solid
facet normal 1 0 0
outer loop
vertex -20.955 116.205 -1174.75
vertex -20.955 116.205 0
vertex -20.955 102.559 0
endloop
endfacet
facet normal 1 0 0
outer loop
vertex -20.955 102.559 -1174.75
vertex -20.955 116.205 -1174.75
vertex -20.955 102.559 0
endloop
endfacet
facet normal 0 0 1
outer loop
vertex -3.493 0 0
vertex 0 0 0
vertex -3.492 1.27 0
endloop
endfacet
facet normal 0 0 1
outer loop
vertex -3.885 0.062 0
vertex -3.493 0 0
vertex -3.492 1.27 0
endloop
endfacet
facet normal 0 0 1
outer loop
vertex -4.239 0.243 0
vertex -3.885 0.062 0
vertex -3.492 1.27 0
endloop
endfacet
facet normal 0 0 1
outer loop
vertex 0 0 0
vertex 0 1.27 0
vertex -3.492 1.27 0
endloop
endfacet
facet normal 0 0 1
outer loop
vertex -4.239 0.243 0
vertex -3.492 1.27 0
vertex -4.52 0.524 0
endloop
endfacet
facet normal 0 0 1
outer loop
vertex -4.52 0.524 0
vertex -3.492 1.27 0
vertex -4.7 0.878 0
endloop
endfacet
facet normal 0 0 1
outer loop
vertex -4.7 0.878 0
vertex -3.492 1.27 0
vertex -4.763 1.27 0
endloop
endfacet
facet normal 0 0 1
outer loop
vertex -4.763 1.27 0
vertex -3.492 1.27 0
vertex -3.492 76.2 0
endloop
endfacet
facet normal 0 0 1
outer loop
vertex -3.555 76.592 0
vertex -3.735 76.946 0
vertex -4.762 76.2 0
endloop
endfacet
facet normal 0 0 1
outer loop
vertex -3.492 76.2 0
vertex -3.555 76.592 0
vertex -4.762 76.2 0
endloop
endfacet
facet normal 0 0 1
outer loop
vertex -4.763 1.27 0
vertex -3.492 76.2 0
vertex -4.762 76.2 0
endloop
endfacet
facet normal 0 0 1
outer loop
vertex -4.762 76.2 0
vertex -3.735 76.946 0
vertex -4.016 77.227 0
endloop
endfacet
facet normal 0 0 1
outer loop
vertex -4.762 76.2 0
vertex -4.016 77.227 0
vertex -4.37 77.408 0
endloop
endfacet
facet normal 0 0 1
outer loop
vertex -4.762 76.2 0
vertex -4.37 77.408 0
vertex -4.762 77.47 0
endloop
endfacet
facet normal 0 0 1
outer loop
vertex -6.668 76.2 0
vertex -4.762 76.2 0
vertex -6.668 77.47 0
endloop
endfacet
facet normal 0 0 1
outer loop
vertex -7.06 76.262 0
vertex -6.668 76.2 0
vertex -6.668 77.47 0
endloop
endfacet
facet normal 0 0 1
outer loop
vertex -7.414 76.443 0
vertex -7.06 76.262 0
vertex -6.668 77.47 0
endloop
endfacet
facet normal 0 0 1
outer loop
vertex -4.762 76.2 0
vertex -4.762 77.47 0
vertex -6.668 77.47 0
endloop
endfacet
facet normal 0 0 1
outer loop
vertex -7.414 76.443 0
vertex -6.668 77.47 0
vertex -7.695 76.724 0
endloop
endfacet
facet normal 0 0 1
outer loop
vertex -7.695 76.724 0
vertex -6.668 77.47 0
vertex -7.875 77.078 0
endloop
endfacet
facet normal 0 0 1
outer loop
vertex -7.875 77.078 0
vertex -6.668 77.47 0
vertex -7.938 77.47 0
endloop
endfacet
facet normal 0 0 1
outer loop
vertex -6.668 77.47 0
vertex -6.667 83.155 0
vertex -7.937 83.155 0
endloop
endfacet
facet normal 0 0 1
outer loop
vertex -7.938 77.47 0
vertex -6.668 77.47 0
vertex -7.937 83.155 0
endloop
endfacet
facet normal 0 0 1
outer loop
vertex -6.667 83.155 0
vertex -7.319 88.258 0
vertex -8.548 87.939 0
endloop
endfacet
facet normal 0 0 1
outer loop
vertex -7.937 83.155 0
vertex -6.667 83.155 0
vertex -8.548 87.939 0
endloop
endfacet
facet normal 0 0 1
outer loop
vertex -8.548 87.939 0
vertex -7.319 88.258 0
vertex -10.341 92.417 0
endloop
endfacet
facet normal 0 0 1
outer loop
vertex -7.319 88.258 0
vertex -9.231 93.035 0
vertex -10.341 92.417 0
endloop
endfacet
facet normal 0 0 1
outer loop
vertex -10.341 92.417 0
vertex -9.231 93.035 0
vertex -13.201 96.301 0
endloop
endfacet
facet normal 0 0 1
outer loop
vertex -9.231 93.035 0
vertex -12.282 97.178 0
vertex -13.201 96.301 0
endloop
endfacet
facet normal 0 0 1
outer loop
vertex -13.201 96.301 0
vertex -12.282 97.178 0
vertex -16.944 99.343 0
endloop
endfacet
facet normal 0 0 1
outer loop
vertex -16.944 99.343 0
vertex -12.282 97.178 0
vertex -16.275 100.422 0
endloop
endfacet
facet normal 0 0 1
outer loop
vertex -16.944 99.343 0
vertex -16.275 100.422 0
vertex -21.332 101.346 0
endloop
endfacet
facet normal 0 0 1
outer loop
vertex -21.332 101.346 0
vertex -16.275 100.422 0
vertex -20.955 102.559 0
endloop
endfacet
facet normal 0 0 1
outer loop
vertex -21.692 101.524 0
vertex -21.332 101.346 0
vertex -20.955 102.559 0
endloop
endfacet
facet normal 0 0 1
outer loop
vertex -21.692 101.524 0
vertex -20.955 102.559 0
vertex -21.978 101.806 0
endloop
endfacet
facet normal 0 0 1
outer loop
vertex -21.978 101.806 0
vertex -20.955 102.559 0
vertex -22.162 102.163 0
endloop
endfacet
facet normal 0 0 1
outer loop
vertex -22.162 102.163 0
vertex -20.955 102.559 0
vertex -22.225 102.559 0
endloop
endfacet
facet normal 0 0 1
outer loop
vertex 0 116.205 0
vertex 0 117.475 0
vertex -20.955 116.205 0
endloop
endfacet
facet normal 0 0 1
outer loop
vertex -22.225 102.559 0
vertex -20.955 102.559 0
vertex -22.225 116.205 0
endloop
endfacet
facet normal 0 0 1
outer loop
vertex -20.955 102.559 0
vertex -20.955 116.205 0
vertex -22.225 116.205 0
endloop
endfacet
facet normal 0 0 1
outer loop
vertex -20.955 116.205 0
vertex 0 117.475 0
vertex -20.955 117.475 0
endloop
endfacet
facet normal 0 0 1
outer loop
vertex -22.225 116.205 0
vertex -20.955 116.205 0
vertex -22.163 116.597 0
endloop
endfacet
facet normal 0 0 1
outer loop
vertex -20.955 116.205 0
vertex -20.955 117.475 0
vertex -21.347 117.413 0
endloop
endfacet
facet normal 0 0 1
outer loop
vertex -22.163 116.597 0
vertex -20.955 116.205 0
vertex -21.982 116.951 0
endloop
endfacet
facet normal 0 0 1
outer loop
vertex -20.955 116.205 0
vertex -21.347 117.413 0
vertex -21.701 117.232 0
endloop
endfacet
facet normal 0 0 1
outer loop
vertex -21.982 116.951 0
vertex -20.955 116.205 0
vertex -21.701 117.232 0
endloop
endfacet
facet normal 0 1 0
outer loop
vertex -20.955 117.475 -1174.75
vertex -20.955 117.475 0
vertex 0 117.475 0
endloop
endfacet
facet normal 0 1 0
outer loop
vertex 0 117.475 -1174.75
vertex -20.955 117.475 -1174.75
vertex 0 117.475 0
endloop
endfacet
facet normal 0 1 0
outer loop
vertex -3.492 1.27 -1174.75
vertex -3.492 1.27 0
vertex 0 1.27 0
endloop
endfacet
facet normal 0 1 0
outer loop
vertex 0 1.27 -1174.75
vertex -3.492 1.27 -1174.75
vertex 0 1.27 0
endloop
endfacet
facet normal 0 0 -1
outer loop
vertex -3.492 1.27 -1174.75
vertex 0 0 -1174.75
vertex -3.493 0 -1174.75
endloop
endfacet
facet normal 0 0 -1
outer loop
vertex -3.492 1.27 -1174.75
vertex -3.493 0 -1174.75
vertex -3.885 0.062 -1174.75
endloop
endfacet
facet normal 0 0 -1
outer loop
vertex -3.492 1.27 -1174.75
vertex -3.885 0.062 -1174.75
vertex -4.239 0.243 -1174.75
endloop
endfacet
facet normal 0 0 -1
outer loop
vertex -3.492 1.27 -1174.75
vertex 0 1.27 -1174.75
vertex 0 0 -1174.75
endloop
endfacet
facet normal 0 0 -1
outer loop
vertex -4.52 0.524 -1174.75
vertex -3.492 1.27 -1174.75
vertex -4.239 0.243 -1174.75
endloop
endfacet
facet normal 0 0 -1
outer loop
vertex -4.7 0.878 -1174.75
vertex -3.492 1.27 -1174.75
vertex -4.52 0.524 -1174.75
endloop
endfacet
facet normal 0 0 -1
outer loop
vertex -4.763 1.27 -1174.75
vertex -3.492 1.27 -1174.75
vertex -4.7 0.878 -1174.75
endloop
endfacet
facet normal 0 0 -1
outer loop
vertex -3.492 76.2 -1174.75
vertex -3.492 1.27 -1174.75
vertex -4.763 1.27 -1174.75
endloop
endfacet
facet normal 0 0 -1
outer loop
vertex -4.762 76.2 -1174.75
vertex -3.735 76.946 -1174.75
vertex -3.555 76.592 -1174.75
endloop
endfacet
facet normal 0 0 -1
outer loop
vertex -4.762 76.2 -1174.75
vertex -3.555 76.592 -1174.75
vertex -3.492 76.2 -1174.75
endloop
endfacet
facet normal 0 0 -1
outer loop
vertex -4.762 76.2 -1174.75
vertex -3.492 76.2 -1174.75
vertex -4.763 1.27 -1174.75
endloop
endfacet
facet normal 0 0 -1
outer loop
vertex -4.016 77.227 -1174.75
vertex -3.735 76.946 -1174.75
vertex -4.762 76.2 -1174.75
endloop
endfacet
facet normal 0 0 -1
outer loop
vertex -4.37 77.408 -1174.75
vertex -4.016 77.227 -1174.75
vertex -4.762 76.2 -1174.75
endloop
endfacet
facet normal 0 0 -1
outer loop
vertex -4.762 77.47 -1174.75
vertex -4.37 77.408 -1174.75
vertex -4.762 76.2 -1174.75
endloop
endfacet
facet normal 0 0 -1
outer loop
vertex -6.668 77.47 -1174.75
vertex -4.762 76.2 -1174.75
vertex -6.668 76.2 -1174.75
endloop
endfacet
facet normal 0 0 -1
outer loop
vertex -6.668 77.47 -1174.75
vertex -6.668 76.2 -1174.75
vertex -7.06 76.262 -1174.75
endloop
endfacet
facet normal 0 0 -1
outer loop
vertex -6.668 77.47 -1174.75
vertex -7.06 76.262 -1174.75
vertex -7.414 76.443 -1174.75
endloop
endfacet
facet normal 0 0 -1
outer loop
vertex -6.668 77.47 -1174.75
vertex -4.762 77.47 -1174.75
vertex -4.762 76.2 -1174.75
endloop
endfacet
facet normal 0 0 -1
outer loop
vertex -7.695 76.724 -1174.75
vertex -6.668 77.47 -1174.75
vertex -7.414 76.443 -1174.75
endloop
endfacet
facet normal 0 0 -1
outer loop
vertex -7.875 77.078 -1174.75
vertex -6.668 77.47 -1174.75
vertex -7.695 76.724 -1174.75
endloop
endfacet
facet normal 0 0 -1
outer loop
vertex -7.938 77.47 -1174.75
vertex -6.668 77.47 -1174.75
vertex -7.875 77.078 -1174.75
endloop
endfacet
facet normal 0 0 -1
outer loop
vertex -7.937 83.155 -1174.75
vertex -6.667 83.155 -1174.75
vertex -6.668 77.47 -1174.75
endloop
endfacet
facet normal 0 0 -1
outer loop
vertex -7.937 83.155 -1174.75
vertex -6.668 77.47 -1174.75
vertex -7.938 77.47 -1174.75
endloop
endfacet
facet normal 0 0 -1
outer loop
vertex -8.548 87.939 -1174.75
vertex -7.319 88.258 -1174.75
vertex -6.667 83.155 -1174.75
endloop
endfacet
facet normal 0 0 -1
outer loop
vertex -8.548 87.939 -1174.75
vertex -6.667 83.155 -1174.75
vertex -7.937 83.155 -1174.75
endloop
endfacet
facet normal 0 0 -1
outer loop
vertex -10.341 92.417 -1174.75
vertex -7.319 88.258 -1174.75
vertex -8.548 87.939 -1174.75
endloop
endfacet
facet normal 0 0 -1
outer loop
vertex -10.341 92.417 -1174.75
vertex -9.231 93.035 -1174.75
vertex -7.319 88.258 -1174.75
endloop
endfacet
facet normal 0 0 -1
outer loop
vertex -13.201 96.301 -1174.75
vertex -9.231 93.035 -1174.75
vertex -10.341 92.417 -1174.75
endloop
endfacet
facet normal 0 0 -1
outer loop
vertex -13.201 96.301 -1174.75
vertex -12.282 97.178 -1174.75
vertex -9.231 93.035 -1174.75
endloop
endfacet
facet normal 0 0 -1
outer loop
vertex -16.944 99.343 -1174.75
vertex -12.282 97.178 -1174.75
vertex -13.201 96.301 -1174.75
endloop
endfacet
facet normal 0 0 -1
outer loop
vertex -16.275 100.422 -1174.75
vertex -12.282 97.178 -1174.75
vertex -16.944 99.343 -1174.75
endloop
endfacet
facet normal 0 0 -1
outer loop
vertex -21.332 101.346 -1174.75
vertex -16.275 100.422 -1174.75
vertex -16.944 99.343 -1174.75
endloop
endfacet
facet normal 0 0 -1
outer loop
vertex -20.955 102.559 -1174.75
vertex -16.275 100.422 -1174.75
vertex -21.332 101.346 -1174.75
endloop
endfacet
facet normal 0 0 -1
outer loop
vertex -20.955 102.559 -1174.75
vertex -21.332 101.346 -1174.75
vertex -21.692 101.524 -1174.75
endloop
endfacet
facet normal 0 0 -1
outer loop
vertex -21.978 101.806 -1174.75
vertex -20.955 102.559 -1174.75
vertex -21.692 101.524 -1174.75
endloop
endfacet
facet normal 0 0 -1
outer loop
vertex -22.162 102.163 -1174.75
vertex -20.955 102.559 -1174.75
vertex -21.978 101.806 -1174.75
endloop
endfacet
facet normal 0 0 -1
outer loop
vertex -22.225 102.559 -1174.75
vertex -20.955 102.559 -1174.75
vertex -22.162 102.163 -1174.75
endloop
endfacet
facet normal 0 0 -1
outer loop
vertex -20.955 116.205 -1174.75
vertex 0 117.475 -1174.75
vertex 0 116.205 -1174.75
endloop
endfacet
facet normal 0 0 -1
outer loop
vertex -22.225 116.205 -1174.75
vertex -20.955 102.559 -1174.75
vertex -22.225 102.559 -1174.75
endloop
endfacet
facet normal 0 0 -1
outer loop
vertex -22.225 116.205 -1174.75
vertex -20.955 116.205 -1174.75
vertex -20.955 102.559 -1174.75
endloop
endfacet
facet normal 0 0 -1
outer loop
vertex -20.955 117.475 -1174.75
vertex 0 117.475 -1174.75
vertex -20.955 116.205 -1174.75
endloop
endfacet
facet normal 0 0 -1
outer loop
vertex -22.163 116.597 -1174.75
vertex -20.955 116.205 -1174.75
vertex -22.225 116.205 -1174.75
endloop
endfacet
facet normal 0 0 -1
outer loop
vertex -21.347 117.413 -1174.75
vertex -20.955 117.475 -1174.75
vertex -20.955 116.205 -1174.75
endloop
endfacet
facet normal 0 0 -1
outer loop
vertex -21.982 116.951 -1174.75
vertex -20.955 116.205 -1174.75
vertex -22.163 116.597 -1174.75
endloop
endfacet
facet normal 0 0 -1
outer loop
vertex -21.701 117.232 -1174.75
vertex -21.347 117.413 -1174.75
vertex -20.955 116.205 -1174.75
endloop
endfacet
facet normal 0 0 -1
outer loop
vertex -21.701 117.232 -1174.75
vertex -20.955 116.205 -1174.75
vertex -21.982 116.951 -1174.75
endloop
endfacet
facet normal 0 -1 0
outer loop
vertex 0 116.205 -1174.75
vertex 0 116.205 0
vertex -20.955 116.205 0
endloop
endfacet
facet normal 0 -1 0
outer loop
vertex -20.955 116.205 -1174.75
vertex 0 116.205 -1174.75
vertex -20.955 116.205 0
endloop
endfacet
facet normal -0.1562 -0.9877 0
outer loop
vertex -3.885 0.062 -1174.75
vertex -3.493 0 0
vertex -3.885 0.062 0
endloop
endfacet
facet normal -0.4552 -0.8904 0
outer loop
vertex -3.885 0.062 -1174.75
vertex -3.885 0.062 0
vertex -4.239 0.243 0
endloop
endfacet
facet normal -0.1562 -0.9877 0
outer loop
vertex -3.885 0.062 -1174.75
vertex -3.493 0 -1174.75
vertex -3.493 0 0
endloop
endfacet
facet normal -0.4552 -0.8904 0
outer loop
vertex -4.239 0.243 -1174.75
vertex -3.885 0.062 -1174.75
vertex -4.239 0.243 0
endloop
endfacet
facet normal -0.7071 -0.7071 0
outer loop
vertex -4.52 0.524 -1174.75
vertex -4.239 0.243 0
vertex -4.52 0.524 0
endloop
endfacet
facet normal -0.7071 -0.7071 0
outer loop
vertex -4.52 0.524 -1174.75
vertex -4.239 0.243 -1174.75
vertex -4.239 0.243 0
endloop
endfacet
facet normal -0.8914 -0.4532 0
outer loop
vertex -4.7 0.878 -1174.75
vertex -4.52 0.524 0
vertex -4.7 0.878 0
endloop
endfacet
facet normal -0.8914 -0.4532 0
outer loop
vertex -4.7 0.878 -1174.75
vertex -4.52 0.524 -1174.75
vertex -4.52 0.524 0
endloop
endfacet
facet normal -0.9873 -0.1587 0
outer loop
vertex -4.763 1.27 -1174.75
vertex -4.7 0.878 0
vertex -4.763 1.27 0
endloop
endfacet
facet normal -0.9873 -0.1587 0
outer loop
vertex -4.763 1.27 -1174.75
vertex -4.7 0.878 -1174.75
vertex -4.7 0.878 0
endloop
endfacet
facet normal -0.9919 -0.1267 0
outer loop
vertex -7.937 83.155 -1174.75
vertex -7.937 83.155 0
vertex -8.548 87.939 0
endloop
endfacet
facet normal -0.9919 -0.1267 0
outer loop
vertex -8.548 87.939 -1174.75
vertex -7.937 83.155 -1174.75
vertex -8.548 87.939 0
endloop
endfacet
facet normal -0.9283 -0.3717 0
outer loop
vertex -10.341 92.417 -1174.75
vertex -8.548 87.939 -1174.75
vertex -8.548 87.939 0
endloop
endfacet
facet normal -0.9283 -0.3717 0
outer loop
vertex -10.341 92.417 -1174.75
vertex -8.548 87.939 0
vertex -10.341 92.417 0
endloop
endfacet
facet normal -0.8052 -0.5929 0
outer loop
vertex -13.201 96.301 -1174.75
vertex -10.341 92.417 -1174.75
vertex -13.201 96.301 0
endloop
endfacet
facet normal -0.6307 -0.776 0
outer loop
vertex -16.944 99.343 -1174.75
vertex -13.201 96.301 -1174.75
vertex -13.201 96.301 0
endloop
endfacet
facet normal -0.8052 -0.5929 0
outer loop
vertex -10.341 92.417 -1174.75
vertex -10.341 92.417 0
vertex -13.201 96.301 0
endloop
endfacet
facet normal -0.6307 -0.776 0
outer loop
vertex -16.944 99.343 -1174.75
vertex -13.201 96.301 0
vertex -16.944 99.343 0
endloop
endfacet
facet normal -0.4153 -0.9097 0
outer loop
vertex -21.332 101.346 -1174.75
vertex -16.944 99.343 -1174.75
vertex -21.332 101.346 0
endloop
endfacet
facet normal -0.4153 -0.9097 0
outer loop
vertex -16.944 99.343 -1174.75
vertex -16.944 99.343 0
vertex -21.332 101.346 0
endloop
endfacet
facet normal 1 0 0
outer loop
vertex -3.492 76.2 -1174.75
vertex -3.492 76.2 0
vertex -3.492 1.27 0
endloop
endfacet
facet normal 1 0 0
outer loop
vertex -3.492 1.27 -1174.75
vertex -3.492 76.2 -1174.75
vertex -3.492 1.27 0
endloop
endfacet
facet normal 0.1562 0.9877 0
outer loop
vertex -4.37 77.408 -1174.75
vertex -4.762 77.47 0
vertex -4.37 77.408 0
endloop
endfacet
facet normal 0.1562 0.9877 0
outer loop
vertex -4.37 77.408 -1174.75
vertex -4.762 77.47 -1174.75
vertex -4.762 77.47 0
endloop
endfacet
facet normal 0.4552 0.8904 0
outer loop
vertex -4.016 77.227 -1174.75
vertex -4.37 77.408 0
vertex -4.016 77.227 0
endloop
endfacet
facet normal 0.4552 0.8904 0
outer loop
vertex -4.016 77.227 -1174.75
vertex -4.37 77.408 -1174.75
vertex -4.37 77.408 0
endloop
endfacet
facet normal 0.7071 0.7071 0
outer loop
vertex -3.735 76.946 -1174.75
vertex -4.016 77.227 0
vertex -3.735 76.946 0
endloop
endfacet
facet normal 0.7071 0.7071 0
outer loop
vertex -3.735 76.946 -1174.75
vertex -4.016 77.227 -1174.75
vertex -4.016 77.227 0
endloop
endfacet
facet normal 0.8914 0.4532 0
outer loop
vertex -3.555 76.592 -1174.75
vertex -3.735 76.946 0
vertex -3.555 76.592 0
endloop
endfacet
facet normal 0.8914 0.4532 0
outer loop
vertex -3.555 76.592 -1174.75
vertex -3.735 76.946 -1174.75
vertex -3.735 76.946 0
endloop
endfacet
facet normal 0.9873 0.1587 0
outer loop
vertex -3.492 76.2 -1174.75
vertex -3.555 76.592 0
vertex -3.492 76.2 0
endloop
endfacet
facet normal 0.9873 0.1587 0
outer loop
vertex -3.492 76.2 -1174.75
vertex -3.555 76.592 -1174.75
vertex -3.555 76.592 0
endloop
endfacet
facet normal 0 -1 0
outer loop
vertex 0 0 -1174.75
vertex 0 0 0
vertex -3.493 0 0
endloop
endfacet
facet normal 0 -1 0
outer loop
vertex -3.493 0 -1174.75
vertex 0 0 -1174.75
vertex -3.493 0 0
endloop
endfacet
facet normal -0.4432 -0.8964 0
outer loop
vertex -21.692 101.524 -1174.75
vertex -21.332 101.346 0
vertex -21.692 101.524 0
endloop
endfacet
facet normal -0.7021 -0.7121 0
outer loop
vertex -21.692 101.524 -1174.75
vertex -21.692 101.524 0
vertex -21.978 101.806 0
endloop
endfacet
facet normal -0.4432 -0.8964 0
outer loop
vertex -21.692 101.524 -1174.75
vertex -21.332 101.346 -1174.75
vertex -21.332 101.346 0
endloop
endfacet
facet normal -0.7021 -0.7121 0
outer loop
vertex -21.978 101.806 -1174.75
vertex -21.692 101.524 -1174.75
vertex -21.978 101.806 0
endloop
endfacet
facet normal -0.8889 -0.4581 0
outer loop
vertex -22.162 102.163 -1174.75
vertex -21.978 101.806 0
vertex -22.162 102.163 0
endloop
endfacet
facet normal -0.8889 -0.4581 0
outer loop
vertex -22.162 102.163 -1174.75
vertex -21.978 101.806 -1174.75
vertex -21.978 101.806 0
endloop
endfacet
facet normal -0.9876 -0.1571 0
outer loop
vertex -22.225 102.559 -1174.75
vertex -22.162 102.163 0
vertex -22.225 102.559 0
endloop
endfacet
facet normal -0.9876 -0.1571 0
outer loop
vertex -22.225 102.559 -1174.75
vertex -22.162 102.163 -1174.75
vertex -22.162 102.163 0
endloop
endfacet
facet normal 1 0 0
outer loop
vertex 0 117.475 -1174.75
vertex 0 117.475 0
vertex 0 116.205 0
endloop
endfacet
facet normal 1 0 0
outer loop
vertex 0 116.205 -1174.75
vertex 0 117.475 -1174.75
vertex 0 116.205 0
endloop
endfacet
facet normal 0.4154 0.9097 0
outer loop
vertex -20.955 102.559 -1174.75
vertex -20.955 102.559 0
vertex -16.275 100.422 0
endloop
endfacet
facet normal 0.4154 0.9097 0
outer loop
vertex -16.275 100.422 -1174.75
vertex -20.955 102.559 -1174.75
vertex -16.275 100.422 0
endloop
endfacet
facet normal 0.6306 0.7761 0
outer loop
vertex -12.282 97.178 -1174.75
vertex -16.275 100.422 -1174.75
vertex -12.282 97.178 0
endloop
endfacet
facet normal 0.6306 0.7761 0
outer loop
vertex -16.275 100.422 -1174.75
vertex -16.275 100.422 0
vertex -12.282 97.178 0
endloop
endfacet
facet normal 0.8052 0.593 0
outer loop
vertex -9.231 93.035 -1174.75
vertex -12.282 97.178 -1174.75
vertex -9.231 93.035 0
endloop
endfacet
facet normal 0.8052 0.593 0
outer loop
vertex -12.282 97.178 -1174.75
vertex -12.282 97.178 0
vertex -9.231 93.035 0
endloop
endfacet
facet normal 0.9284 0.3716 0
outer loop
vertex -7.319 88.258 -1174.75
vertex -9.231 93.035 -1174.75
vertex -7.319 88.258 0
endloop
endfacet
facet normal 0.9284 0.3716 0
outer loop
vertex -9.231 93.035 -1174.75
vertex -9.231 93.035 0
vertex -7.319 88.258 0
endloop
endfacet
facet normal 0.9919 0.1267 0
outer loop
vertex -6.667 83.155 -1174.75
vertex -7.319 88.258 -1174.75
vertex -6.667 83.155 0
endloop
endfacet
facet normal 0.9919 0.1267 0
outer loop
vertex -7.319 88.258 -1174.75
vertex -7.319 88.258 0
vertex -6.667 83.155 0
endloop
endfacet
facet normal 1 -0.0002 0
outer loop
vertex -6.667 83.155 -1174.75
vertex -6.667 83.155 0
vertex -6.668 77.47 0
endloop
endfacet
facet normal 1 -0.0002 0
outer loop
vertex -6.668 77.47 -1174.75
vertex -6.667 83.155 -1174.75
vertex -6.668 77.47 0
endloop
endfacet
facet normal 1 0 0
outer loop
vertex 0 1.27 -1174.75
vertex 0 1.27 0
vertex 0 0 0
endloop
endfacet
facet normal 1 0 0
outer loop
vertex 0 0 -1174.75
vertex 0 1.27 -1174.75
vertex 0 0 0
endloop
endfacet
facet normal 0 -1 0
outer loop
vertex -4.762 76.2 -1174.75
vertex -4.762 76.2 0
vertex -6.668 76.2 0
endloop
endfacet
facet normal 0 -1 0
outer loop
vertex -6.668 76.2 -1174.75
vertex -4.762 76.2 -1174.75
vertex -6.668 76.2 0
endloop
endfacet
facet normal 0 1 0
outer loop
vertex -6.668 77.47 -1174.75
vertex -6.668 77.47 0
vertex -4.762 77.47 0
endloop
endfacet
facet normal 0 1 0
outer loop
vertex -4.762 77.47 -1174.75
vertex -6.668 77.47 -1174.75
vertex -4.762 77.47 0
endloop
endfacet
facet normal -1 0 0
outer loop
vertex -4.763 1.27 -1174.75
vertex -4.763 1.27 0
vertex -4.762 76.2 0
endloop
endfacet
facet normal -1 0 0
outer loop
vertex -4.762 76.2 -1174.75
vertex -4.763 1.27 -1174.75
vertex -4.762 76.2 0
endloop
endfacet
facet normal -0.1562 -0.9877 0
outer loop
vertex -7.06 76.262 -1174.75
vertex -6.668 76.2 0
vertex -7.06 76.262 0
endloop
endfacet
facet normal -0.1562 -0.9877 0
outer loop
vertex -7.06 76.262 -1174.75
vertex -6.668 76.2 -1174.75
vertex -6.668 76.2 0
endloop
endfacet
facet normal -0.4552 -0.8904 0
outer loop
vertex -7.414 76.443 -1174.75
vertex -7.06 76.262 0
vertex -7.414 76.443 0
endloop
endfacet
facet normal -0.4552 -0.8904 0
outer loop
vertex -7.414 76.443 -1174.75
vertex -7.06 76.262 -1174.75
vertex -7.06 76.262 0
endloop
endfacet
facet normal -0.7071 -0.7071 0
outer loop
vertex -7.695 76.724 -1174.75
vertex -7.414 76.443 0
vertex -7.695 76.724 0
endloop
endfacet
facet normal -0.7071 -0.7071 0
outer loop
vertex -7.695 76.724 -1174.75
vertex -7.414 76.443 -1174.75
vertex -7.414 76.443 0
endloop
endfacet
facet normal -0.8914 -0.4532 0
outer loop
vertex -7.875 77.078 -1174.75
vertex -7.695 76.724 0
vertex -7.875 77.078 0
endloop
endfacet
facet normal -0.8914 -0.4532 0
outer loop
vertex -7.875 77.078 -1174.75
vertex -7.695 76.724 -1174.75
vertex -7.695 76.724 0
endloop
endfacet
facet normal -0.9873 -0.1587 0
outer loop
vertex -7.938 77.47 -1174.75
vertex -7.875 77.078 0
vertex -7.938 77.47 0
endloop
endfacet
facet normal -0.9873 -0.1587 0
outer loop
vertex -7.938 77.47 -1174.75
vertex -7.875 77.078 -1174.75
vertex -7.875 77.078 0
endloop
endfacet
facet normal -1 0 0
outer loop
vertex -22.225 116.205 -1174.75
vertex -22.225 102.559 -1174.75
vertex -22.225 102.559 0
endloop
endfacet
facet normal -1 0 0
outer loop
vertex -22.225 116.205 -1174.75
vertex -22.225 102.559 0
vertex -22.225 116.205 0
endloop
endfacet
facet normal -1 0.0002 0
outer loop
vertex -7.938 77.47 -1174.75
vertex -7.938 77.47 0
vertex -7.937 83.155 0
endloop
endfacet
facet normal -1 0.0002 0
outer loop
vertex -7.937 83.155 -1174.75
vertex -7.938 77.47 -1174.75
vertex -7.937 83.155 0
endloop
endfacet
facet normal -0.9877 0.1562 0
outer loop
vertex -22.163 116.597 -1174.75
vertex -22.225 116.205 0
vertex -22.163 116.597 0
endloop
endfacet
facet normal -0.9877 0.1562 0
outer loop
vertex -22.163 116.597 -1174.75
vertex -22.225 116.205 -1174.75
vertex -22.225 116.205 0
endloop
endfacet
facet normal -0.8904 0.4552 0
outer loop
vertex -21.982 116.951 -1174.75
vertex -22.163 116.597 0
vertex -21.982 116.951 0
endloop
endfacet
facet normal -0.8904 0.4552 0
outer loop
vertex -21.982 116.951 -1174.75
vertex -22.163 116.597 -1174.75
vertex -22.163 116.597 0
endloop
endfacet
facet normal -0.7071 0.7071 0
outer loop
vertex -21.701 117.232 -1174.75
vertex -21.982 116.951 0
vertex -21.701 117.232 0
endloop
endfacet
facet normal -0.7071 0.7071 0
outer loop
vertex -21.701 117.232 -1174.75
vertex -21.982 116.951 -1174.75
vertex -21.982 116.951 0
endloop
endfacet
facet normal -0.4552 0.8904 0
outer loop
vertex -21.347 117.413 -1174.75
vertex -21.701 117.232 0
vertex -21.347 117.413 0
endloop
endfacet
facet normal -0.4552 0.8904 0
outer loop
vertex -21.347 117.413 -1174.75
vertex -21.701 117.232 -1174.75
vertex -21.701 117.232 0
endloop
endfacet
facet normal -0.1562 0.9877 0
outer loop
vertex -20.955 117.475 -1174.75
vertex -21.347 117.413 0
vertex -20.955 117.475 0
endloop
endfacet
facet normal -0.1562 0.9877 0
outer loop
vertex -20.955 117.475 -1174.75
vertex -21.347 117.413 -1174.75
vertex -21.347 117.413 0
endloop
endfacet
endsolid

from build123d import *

# Parameters (mm, degrees)
EXTRUDE_THIN1_DEPTH = 1174.75
FILLET1_R           = 1.27


with BuildPart() as part:
    # Sketch1 → Extrude-Thin1 (new body)
    with BuildSketch(Plane.XY):
        with BuildLine():
            Line((0, 0), (-4.7625, 0))
            Line((-4.7625, 0), (-4.7625, 76.2))
            Line((-4.7625, 76.2), (-7.9375, 76.2))
            Line((-7.9375, 76.2), (-7.9375, 83.154916814))
            ThreePointArc((-7.9375, 83.154916814), (-11.927152643, 94.820611714), (-22.225, 101.6))
            Line((-22.225, 101.6), (-22.225, 117.475))
            Line((-22.225, 117.475), (0, 117.475))
            Line((0, 117.475), (0, 116.205))
            Line((0, 116.205), (-20.955, 116.205))
            Line((-20.955, 116.205), (-20.955, 102.558817034))
            ThreePointArc((-20.955, 102.558817034), (-10.624694617, 95.203194699), (-6.6675, 83.154916814))
            Line((-6.6675, 83.154916814), (-6.6675, 77.47))
            Line((-6.6675, 77.47), (-3.4925, 77.47))
            Line((-3.4925, 77.47), (-3.4925, 1.27))
            Line((-3.4925, 1.27), (0, 1.27))
            Line((0, 1.27), (0, 0))
        make_face()
    extrude(amount=-EXTRUDE_THIN1_DEPTH)

    # Fillet1
    fillet1_edges = [part.edges().sort_by_distance(p)[0] for p in [
        (-3.4925, 77.47, -587.375),
        (-4.7625, 0, -587.375),
        (-7.9375, 76.2, -587.375),
        (-22.225, 101.6, -587.375),
        (-22.225, 117.475, -587.375),
    ]]
    fillet(fillet1_edges, radius=FILLET1_R)


solid = part.part
